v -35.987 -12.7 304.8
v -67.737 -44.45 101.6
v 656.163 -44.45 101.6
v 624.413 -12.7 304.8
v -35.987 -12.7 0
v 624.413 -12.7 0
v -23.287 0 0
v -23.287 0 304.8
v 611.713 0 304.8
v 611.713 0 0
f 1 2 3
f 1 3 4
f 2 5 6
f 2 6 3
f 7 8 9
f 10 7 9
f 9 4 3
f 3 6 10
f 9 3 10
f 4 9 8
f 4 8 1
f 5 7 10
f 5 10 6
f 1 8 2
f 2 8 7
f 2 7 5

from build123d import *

# Parameters (mm, degrees)
F0_W     = 736.6
F0_H     = 304.8
F1_DEPTH = 44.45
F3_DEPTH = 736.601
F5_DEPTH = 304.801


with BuildPart() as f1:
    # F0 (on Front) → F1 (new body)
    with BuildSketch(Plane.XZ):
        with Locations((294.213133, 152.4)):
            Rectangle(F0_W, F0_H)
    extrude(amount=F1_DEPTH)

    # F2 (on face) → F3 (cut, through all)
    with BuildSketch(Plane.YZ.offset(662.513133)):
        Polygon((-44.45, 101.6), (-12.7, 304.8), (-82.839599, 304.8), (-82.839599, 0), (-12.7, 0), align=None)
    extrude(amount=-F3_DEPTH, mode=Mode.SUBTRACT)

    # F4 (on face) → F5 (cut, through all)
    with BuildSketch(Plane(origin=(0, 0, 0), x_dir=(1, 0, 0), z_dir=(0, 0, -1))):
        Polygon((662.513133, 0), (662.513133, 50.8), (611.713133, 0), align=None)
        Polygon((-23.286867, 0), (-74.086867, 50.8), (-74.086867, 0), align=None)
    extrude(amount=-F5_DEPTH, mode=Mode.SUBTRACT)


solid = f1.part
